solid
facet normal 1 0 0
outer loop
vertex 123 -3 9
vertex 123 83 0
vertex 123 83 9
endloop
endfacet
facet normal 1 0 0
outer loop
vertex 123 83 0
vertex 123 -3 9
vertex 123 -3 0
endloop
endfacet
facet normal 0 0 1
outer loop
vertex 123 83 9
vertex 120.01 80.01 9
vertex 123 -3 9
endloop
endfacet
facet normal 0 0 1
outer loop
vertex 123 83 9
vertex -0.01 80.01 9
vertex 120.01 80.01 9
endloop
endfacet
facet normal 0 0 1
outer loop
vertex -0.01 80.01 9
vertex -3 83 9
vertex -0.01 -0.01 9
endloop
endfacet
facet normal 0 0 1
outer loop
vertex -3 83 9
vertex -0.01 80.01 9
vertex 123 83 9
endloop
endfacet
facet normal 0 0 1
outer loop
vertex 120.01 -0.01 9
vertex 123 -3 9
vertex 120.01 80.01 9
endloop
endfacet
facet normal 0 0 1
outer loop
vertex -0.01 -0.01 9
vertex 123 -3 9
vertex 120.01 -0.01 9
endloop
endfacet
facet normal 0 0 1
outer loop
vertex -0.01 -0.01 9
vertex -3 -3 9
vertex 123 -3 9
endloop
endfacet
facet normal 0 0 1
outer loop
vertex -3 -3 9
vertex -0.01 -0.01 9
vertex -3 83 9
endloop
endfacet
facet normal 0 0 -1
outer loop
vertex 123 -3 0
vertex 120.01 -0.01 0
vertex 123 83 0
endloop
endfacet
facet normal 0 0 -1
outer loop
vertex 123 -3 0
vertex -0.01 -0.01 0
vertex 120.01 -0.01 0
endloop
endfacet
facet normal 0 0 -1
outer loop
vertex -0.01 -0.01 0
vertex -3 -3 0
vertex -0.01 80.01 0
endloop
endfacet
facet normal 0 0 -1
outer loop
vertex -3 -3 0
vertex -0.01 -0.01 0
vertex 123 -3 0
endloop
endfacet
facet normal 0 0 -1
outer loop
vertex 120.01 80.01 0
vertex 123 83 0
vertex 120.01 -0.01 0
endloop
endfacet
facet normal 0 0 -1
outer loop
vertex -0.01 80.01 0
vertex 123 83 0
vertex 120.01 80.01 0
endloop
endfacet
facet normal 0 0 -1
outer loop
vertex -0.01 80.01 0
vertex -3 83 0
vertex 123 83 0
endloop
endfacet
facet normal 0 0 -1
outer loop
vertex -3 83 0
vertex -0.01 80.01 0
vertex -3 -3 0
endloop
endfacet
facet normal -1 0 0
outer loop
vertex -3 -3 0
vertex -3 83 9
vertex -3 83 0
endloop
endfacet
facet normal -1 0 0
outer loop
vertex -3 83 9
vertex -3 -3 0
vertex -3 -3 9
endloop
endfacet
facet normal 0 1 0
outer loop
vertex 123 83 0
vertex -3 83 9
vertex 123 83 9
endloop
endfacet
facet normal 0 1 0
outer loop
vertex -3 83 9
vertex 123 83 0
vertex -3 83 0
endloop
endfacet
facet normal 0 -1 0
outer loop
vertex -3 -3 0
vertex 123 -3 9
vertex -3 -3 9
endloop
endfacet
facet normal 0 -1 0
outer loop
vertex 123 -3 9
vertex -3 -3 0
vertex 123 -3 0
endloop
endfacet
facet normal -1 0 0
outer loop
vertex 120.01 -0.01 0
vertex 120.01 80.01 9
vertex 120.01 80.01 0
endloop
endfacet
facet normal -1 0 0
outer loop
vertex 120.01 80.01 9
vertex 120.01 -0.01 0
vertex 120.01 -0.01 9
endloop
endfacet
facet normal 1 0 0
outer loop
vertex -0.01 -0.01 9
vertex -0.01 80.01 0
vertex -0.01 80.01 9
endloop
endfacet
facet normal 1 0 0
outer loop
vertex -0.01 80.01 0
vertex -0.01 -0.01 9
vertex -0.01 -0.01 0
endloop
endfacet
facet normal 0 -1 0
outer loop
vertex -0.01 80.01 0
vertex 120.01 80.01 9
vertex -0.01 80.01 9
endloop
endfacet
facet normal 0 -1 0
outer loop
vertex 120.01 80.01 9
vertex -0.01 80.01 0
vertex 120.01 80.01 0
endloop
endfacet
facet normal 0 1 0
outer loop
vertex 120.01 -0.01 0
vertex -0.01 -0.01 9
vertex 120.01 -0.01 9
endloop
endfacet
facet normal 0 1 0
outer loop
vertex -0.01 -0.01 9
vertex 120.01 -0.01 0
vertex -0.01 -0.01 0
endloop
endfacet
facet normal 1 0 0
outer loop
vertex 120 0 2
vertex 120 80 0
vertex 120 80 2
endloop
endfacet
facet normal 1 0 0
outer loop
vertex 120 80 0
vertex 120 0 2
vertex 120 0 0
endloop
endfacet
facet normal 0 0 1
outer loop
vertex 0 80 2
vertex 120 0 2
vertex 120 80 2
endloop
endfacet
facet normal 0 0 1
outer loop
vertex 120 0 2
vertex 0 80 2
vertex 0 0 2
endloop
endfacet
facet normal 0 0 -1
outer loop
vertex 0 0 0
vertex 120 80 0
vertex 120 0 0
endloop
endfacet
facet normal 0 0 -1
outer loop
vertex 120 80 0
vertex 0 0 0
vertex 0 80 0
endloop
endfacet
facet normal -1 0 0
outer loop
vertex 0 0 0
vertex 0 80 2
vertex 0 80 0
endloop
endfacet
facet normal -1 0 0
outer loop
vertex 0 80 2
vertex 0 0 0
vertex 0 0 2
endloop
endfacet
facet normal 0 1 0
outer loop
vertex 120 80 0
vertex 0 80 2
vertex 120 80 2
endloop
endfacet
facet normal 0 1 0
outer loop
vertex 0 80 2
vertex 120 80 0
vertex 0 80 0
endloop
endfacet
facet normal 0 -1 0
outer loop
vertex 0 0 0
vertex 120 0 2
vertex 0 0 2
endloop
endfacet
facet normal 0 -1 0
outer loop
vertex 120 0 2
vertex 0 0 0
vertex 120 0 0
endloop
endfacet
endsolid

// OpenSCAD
// Фрактал Мандельброта — рельефное панно для многоцветной 3D-печати
// Использует surface() с предгенерированной картой высот — быстрый рендер.
//
// === ПОДГОТОВКА ===
// python3 generate_heightmap.py > heightmap.dat
//
// === ЭКСПОРТ МНОГОЦВЕТНЫХ STL ===
//   PART = 0  → всё вместе (превью)
//   PART = 1  → основание (цвет 1)
//   PART = 2  → рельеф фрактала (цвет 2)
//   PART = 3  → рамка (цвет 3)

/* ======== ВЫБОР ДЕТАЛИ ======== */

PART = 0;

/* ======== ПАРАМЕТРЫ ======== */

panel_w   = 120;
panel_h   = 80;
base_t    = 2.0;
max_depth = 6.0;
res       = 0.5;      // должен совпадать с generate_heightmap.py

// Рамка
frame_w   = 3;
frame_h   = max_depth + base_t + 1;

/* ======== МОДУЛИ ======== */

module base_plate() {
    cube([panel_w, panel_h, base_t]);
}

module fractal_relief() {
    translate([0, 0, base_t])
        scale([res, res, 1])
            surface(file = "heightmap.dat", center = false, convexity = 4);
}

module frame() {
    difference() {
        translate([-frame_w, -frame_w, 0])
            cube([panel_w + frame_w * 2, panel_h + frame_w * 2, frame_h]);
        translate([-0.01, -0.01, -0.01])
            cube([panel_w + 0.02, panel_h + 0.02, frame_h + 0.02]);
    }
}

/* ======== СБОРКА ======== */

if (PART == 0 || PART == 1)
    color("SteelBlue")   base_plate();

if (PART == 0 || PART == 2)
    color("Gold")         fractal_relief();

if (PART == 0 || PART == 3)
    color("DimGray")      frame();
